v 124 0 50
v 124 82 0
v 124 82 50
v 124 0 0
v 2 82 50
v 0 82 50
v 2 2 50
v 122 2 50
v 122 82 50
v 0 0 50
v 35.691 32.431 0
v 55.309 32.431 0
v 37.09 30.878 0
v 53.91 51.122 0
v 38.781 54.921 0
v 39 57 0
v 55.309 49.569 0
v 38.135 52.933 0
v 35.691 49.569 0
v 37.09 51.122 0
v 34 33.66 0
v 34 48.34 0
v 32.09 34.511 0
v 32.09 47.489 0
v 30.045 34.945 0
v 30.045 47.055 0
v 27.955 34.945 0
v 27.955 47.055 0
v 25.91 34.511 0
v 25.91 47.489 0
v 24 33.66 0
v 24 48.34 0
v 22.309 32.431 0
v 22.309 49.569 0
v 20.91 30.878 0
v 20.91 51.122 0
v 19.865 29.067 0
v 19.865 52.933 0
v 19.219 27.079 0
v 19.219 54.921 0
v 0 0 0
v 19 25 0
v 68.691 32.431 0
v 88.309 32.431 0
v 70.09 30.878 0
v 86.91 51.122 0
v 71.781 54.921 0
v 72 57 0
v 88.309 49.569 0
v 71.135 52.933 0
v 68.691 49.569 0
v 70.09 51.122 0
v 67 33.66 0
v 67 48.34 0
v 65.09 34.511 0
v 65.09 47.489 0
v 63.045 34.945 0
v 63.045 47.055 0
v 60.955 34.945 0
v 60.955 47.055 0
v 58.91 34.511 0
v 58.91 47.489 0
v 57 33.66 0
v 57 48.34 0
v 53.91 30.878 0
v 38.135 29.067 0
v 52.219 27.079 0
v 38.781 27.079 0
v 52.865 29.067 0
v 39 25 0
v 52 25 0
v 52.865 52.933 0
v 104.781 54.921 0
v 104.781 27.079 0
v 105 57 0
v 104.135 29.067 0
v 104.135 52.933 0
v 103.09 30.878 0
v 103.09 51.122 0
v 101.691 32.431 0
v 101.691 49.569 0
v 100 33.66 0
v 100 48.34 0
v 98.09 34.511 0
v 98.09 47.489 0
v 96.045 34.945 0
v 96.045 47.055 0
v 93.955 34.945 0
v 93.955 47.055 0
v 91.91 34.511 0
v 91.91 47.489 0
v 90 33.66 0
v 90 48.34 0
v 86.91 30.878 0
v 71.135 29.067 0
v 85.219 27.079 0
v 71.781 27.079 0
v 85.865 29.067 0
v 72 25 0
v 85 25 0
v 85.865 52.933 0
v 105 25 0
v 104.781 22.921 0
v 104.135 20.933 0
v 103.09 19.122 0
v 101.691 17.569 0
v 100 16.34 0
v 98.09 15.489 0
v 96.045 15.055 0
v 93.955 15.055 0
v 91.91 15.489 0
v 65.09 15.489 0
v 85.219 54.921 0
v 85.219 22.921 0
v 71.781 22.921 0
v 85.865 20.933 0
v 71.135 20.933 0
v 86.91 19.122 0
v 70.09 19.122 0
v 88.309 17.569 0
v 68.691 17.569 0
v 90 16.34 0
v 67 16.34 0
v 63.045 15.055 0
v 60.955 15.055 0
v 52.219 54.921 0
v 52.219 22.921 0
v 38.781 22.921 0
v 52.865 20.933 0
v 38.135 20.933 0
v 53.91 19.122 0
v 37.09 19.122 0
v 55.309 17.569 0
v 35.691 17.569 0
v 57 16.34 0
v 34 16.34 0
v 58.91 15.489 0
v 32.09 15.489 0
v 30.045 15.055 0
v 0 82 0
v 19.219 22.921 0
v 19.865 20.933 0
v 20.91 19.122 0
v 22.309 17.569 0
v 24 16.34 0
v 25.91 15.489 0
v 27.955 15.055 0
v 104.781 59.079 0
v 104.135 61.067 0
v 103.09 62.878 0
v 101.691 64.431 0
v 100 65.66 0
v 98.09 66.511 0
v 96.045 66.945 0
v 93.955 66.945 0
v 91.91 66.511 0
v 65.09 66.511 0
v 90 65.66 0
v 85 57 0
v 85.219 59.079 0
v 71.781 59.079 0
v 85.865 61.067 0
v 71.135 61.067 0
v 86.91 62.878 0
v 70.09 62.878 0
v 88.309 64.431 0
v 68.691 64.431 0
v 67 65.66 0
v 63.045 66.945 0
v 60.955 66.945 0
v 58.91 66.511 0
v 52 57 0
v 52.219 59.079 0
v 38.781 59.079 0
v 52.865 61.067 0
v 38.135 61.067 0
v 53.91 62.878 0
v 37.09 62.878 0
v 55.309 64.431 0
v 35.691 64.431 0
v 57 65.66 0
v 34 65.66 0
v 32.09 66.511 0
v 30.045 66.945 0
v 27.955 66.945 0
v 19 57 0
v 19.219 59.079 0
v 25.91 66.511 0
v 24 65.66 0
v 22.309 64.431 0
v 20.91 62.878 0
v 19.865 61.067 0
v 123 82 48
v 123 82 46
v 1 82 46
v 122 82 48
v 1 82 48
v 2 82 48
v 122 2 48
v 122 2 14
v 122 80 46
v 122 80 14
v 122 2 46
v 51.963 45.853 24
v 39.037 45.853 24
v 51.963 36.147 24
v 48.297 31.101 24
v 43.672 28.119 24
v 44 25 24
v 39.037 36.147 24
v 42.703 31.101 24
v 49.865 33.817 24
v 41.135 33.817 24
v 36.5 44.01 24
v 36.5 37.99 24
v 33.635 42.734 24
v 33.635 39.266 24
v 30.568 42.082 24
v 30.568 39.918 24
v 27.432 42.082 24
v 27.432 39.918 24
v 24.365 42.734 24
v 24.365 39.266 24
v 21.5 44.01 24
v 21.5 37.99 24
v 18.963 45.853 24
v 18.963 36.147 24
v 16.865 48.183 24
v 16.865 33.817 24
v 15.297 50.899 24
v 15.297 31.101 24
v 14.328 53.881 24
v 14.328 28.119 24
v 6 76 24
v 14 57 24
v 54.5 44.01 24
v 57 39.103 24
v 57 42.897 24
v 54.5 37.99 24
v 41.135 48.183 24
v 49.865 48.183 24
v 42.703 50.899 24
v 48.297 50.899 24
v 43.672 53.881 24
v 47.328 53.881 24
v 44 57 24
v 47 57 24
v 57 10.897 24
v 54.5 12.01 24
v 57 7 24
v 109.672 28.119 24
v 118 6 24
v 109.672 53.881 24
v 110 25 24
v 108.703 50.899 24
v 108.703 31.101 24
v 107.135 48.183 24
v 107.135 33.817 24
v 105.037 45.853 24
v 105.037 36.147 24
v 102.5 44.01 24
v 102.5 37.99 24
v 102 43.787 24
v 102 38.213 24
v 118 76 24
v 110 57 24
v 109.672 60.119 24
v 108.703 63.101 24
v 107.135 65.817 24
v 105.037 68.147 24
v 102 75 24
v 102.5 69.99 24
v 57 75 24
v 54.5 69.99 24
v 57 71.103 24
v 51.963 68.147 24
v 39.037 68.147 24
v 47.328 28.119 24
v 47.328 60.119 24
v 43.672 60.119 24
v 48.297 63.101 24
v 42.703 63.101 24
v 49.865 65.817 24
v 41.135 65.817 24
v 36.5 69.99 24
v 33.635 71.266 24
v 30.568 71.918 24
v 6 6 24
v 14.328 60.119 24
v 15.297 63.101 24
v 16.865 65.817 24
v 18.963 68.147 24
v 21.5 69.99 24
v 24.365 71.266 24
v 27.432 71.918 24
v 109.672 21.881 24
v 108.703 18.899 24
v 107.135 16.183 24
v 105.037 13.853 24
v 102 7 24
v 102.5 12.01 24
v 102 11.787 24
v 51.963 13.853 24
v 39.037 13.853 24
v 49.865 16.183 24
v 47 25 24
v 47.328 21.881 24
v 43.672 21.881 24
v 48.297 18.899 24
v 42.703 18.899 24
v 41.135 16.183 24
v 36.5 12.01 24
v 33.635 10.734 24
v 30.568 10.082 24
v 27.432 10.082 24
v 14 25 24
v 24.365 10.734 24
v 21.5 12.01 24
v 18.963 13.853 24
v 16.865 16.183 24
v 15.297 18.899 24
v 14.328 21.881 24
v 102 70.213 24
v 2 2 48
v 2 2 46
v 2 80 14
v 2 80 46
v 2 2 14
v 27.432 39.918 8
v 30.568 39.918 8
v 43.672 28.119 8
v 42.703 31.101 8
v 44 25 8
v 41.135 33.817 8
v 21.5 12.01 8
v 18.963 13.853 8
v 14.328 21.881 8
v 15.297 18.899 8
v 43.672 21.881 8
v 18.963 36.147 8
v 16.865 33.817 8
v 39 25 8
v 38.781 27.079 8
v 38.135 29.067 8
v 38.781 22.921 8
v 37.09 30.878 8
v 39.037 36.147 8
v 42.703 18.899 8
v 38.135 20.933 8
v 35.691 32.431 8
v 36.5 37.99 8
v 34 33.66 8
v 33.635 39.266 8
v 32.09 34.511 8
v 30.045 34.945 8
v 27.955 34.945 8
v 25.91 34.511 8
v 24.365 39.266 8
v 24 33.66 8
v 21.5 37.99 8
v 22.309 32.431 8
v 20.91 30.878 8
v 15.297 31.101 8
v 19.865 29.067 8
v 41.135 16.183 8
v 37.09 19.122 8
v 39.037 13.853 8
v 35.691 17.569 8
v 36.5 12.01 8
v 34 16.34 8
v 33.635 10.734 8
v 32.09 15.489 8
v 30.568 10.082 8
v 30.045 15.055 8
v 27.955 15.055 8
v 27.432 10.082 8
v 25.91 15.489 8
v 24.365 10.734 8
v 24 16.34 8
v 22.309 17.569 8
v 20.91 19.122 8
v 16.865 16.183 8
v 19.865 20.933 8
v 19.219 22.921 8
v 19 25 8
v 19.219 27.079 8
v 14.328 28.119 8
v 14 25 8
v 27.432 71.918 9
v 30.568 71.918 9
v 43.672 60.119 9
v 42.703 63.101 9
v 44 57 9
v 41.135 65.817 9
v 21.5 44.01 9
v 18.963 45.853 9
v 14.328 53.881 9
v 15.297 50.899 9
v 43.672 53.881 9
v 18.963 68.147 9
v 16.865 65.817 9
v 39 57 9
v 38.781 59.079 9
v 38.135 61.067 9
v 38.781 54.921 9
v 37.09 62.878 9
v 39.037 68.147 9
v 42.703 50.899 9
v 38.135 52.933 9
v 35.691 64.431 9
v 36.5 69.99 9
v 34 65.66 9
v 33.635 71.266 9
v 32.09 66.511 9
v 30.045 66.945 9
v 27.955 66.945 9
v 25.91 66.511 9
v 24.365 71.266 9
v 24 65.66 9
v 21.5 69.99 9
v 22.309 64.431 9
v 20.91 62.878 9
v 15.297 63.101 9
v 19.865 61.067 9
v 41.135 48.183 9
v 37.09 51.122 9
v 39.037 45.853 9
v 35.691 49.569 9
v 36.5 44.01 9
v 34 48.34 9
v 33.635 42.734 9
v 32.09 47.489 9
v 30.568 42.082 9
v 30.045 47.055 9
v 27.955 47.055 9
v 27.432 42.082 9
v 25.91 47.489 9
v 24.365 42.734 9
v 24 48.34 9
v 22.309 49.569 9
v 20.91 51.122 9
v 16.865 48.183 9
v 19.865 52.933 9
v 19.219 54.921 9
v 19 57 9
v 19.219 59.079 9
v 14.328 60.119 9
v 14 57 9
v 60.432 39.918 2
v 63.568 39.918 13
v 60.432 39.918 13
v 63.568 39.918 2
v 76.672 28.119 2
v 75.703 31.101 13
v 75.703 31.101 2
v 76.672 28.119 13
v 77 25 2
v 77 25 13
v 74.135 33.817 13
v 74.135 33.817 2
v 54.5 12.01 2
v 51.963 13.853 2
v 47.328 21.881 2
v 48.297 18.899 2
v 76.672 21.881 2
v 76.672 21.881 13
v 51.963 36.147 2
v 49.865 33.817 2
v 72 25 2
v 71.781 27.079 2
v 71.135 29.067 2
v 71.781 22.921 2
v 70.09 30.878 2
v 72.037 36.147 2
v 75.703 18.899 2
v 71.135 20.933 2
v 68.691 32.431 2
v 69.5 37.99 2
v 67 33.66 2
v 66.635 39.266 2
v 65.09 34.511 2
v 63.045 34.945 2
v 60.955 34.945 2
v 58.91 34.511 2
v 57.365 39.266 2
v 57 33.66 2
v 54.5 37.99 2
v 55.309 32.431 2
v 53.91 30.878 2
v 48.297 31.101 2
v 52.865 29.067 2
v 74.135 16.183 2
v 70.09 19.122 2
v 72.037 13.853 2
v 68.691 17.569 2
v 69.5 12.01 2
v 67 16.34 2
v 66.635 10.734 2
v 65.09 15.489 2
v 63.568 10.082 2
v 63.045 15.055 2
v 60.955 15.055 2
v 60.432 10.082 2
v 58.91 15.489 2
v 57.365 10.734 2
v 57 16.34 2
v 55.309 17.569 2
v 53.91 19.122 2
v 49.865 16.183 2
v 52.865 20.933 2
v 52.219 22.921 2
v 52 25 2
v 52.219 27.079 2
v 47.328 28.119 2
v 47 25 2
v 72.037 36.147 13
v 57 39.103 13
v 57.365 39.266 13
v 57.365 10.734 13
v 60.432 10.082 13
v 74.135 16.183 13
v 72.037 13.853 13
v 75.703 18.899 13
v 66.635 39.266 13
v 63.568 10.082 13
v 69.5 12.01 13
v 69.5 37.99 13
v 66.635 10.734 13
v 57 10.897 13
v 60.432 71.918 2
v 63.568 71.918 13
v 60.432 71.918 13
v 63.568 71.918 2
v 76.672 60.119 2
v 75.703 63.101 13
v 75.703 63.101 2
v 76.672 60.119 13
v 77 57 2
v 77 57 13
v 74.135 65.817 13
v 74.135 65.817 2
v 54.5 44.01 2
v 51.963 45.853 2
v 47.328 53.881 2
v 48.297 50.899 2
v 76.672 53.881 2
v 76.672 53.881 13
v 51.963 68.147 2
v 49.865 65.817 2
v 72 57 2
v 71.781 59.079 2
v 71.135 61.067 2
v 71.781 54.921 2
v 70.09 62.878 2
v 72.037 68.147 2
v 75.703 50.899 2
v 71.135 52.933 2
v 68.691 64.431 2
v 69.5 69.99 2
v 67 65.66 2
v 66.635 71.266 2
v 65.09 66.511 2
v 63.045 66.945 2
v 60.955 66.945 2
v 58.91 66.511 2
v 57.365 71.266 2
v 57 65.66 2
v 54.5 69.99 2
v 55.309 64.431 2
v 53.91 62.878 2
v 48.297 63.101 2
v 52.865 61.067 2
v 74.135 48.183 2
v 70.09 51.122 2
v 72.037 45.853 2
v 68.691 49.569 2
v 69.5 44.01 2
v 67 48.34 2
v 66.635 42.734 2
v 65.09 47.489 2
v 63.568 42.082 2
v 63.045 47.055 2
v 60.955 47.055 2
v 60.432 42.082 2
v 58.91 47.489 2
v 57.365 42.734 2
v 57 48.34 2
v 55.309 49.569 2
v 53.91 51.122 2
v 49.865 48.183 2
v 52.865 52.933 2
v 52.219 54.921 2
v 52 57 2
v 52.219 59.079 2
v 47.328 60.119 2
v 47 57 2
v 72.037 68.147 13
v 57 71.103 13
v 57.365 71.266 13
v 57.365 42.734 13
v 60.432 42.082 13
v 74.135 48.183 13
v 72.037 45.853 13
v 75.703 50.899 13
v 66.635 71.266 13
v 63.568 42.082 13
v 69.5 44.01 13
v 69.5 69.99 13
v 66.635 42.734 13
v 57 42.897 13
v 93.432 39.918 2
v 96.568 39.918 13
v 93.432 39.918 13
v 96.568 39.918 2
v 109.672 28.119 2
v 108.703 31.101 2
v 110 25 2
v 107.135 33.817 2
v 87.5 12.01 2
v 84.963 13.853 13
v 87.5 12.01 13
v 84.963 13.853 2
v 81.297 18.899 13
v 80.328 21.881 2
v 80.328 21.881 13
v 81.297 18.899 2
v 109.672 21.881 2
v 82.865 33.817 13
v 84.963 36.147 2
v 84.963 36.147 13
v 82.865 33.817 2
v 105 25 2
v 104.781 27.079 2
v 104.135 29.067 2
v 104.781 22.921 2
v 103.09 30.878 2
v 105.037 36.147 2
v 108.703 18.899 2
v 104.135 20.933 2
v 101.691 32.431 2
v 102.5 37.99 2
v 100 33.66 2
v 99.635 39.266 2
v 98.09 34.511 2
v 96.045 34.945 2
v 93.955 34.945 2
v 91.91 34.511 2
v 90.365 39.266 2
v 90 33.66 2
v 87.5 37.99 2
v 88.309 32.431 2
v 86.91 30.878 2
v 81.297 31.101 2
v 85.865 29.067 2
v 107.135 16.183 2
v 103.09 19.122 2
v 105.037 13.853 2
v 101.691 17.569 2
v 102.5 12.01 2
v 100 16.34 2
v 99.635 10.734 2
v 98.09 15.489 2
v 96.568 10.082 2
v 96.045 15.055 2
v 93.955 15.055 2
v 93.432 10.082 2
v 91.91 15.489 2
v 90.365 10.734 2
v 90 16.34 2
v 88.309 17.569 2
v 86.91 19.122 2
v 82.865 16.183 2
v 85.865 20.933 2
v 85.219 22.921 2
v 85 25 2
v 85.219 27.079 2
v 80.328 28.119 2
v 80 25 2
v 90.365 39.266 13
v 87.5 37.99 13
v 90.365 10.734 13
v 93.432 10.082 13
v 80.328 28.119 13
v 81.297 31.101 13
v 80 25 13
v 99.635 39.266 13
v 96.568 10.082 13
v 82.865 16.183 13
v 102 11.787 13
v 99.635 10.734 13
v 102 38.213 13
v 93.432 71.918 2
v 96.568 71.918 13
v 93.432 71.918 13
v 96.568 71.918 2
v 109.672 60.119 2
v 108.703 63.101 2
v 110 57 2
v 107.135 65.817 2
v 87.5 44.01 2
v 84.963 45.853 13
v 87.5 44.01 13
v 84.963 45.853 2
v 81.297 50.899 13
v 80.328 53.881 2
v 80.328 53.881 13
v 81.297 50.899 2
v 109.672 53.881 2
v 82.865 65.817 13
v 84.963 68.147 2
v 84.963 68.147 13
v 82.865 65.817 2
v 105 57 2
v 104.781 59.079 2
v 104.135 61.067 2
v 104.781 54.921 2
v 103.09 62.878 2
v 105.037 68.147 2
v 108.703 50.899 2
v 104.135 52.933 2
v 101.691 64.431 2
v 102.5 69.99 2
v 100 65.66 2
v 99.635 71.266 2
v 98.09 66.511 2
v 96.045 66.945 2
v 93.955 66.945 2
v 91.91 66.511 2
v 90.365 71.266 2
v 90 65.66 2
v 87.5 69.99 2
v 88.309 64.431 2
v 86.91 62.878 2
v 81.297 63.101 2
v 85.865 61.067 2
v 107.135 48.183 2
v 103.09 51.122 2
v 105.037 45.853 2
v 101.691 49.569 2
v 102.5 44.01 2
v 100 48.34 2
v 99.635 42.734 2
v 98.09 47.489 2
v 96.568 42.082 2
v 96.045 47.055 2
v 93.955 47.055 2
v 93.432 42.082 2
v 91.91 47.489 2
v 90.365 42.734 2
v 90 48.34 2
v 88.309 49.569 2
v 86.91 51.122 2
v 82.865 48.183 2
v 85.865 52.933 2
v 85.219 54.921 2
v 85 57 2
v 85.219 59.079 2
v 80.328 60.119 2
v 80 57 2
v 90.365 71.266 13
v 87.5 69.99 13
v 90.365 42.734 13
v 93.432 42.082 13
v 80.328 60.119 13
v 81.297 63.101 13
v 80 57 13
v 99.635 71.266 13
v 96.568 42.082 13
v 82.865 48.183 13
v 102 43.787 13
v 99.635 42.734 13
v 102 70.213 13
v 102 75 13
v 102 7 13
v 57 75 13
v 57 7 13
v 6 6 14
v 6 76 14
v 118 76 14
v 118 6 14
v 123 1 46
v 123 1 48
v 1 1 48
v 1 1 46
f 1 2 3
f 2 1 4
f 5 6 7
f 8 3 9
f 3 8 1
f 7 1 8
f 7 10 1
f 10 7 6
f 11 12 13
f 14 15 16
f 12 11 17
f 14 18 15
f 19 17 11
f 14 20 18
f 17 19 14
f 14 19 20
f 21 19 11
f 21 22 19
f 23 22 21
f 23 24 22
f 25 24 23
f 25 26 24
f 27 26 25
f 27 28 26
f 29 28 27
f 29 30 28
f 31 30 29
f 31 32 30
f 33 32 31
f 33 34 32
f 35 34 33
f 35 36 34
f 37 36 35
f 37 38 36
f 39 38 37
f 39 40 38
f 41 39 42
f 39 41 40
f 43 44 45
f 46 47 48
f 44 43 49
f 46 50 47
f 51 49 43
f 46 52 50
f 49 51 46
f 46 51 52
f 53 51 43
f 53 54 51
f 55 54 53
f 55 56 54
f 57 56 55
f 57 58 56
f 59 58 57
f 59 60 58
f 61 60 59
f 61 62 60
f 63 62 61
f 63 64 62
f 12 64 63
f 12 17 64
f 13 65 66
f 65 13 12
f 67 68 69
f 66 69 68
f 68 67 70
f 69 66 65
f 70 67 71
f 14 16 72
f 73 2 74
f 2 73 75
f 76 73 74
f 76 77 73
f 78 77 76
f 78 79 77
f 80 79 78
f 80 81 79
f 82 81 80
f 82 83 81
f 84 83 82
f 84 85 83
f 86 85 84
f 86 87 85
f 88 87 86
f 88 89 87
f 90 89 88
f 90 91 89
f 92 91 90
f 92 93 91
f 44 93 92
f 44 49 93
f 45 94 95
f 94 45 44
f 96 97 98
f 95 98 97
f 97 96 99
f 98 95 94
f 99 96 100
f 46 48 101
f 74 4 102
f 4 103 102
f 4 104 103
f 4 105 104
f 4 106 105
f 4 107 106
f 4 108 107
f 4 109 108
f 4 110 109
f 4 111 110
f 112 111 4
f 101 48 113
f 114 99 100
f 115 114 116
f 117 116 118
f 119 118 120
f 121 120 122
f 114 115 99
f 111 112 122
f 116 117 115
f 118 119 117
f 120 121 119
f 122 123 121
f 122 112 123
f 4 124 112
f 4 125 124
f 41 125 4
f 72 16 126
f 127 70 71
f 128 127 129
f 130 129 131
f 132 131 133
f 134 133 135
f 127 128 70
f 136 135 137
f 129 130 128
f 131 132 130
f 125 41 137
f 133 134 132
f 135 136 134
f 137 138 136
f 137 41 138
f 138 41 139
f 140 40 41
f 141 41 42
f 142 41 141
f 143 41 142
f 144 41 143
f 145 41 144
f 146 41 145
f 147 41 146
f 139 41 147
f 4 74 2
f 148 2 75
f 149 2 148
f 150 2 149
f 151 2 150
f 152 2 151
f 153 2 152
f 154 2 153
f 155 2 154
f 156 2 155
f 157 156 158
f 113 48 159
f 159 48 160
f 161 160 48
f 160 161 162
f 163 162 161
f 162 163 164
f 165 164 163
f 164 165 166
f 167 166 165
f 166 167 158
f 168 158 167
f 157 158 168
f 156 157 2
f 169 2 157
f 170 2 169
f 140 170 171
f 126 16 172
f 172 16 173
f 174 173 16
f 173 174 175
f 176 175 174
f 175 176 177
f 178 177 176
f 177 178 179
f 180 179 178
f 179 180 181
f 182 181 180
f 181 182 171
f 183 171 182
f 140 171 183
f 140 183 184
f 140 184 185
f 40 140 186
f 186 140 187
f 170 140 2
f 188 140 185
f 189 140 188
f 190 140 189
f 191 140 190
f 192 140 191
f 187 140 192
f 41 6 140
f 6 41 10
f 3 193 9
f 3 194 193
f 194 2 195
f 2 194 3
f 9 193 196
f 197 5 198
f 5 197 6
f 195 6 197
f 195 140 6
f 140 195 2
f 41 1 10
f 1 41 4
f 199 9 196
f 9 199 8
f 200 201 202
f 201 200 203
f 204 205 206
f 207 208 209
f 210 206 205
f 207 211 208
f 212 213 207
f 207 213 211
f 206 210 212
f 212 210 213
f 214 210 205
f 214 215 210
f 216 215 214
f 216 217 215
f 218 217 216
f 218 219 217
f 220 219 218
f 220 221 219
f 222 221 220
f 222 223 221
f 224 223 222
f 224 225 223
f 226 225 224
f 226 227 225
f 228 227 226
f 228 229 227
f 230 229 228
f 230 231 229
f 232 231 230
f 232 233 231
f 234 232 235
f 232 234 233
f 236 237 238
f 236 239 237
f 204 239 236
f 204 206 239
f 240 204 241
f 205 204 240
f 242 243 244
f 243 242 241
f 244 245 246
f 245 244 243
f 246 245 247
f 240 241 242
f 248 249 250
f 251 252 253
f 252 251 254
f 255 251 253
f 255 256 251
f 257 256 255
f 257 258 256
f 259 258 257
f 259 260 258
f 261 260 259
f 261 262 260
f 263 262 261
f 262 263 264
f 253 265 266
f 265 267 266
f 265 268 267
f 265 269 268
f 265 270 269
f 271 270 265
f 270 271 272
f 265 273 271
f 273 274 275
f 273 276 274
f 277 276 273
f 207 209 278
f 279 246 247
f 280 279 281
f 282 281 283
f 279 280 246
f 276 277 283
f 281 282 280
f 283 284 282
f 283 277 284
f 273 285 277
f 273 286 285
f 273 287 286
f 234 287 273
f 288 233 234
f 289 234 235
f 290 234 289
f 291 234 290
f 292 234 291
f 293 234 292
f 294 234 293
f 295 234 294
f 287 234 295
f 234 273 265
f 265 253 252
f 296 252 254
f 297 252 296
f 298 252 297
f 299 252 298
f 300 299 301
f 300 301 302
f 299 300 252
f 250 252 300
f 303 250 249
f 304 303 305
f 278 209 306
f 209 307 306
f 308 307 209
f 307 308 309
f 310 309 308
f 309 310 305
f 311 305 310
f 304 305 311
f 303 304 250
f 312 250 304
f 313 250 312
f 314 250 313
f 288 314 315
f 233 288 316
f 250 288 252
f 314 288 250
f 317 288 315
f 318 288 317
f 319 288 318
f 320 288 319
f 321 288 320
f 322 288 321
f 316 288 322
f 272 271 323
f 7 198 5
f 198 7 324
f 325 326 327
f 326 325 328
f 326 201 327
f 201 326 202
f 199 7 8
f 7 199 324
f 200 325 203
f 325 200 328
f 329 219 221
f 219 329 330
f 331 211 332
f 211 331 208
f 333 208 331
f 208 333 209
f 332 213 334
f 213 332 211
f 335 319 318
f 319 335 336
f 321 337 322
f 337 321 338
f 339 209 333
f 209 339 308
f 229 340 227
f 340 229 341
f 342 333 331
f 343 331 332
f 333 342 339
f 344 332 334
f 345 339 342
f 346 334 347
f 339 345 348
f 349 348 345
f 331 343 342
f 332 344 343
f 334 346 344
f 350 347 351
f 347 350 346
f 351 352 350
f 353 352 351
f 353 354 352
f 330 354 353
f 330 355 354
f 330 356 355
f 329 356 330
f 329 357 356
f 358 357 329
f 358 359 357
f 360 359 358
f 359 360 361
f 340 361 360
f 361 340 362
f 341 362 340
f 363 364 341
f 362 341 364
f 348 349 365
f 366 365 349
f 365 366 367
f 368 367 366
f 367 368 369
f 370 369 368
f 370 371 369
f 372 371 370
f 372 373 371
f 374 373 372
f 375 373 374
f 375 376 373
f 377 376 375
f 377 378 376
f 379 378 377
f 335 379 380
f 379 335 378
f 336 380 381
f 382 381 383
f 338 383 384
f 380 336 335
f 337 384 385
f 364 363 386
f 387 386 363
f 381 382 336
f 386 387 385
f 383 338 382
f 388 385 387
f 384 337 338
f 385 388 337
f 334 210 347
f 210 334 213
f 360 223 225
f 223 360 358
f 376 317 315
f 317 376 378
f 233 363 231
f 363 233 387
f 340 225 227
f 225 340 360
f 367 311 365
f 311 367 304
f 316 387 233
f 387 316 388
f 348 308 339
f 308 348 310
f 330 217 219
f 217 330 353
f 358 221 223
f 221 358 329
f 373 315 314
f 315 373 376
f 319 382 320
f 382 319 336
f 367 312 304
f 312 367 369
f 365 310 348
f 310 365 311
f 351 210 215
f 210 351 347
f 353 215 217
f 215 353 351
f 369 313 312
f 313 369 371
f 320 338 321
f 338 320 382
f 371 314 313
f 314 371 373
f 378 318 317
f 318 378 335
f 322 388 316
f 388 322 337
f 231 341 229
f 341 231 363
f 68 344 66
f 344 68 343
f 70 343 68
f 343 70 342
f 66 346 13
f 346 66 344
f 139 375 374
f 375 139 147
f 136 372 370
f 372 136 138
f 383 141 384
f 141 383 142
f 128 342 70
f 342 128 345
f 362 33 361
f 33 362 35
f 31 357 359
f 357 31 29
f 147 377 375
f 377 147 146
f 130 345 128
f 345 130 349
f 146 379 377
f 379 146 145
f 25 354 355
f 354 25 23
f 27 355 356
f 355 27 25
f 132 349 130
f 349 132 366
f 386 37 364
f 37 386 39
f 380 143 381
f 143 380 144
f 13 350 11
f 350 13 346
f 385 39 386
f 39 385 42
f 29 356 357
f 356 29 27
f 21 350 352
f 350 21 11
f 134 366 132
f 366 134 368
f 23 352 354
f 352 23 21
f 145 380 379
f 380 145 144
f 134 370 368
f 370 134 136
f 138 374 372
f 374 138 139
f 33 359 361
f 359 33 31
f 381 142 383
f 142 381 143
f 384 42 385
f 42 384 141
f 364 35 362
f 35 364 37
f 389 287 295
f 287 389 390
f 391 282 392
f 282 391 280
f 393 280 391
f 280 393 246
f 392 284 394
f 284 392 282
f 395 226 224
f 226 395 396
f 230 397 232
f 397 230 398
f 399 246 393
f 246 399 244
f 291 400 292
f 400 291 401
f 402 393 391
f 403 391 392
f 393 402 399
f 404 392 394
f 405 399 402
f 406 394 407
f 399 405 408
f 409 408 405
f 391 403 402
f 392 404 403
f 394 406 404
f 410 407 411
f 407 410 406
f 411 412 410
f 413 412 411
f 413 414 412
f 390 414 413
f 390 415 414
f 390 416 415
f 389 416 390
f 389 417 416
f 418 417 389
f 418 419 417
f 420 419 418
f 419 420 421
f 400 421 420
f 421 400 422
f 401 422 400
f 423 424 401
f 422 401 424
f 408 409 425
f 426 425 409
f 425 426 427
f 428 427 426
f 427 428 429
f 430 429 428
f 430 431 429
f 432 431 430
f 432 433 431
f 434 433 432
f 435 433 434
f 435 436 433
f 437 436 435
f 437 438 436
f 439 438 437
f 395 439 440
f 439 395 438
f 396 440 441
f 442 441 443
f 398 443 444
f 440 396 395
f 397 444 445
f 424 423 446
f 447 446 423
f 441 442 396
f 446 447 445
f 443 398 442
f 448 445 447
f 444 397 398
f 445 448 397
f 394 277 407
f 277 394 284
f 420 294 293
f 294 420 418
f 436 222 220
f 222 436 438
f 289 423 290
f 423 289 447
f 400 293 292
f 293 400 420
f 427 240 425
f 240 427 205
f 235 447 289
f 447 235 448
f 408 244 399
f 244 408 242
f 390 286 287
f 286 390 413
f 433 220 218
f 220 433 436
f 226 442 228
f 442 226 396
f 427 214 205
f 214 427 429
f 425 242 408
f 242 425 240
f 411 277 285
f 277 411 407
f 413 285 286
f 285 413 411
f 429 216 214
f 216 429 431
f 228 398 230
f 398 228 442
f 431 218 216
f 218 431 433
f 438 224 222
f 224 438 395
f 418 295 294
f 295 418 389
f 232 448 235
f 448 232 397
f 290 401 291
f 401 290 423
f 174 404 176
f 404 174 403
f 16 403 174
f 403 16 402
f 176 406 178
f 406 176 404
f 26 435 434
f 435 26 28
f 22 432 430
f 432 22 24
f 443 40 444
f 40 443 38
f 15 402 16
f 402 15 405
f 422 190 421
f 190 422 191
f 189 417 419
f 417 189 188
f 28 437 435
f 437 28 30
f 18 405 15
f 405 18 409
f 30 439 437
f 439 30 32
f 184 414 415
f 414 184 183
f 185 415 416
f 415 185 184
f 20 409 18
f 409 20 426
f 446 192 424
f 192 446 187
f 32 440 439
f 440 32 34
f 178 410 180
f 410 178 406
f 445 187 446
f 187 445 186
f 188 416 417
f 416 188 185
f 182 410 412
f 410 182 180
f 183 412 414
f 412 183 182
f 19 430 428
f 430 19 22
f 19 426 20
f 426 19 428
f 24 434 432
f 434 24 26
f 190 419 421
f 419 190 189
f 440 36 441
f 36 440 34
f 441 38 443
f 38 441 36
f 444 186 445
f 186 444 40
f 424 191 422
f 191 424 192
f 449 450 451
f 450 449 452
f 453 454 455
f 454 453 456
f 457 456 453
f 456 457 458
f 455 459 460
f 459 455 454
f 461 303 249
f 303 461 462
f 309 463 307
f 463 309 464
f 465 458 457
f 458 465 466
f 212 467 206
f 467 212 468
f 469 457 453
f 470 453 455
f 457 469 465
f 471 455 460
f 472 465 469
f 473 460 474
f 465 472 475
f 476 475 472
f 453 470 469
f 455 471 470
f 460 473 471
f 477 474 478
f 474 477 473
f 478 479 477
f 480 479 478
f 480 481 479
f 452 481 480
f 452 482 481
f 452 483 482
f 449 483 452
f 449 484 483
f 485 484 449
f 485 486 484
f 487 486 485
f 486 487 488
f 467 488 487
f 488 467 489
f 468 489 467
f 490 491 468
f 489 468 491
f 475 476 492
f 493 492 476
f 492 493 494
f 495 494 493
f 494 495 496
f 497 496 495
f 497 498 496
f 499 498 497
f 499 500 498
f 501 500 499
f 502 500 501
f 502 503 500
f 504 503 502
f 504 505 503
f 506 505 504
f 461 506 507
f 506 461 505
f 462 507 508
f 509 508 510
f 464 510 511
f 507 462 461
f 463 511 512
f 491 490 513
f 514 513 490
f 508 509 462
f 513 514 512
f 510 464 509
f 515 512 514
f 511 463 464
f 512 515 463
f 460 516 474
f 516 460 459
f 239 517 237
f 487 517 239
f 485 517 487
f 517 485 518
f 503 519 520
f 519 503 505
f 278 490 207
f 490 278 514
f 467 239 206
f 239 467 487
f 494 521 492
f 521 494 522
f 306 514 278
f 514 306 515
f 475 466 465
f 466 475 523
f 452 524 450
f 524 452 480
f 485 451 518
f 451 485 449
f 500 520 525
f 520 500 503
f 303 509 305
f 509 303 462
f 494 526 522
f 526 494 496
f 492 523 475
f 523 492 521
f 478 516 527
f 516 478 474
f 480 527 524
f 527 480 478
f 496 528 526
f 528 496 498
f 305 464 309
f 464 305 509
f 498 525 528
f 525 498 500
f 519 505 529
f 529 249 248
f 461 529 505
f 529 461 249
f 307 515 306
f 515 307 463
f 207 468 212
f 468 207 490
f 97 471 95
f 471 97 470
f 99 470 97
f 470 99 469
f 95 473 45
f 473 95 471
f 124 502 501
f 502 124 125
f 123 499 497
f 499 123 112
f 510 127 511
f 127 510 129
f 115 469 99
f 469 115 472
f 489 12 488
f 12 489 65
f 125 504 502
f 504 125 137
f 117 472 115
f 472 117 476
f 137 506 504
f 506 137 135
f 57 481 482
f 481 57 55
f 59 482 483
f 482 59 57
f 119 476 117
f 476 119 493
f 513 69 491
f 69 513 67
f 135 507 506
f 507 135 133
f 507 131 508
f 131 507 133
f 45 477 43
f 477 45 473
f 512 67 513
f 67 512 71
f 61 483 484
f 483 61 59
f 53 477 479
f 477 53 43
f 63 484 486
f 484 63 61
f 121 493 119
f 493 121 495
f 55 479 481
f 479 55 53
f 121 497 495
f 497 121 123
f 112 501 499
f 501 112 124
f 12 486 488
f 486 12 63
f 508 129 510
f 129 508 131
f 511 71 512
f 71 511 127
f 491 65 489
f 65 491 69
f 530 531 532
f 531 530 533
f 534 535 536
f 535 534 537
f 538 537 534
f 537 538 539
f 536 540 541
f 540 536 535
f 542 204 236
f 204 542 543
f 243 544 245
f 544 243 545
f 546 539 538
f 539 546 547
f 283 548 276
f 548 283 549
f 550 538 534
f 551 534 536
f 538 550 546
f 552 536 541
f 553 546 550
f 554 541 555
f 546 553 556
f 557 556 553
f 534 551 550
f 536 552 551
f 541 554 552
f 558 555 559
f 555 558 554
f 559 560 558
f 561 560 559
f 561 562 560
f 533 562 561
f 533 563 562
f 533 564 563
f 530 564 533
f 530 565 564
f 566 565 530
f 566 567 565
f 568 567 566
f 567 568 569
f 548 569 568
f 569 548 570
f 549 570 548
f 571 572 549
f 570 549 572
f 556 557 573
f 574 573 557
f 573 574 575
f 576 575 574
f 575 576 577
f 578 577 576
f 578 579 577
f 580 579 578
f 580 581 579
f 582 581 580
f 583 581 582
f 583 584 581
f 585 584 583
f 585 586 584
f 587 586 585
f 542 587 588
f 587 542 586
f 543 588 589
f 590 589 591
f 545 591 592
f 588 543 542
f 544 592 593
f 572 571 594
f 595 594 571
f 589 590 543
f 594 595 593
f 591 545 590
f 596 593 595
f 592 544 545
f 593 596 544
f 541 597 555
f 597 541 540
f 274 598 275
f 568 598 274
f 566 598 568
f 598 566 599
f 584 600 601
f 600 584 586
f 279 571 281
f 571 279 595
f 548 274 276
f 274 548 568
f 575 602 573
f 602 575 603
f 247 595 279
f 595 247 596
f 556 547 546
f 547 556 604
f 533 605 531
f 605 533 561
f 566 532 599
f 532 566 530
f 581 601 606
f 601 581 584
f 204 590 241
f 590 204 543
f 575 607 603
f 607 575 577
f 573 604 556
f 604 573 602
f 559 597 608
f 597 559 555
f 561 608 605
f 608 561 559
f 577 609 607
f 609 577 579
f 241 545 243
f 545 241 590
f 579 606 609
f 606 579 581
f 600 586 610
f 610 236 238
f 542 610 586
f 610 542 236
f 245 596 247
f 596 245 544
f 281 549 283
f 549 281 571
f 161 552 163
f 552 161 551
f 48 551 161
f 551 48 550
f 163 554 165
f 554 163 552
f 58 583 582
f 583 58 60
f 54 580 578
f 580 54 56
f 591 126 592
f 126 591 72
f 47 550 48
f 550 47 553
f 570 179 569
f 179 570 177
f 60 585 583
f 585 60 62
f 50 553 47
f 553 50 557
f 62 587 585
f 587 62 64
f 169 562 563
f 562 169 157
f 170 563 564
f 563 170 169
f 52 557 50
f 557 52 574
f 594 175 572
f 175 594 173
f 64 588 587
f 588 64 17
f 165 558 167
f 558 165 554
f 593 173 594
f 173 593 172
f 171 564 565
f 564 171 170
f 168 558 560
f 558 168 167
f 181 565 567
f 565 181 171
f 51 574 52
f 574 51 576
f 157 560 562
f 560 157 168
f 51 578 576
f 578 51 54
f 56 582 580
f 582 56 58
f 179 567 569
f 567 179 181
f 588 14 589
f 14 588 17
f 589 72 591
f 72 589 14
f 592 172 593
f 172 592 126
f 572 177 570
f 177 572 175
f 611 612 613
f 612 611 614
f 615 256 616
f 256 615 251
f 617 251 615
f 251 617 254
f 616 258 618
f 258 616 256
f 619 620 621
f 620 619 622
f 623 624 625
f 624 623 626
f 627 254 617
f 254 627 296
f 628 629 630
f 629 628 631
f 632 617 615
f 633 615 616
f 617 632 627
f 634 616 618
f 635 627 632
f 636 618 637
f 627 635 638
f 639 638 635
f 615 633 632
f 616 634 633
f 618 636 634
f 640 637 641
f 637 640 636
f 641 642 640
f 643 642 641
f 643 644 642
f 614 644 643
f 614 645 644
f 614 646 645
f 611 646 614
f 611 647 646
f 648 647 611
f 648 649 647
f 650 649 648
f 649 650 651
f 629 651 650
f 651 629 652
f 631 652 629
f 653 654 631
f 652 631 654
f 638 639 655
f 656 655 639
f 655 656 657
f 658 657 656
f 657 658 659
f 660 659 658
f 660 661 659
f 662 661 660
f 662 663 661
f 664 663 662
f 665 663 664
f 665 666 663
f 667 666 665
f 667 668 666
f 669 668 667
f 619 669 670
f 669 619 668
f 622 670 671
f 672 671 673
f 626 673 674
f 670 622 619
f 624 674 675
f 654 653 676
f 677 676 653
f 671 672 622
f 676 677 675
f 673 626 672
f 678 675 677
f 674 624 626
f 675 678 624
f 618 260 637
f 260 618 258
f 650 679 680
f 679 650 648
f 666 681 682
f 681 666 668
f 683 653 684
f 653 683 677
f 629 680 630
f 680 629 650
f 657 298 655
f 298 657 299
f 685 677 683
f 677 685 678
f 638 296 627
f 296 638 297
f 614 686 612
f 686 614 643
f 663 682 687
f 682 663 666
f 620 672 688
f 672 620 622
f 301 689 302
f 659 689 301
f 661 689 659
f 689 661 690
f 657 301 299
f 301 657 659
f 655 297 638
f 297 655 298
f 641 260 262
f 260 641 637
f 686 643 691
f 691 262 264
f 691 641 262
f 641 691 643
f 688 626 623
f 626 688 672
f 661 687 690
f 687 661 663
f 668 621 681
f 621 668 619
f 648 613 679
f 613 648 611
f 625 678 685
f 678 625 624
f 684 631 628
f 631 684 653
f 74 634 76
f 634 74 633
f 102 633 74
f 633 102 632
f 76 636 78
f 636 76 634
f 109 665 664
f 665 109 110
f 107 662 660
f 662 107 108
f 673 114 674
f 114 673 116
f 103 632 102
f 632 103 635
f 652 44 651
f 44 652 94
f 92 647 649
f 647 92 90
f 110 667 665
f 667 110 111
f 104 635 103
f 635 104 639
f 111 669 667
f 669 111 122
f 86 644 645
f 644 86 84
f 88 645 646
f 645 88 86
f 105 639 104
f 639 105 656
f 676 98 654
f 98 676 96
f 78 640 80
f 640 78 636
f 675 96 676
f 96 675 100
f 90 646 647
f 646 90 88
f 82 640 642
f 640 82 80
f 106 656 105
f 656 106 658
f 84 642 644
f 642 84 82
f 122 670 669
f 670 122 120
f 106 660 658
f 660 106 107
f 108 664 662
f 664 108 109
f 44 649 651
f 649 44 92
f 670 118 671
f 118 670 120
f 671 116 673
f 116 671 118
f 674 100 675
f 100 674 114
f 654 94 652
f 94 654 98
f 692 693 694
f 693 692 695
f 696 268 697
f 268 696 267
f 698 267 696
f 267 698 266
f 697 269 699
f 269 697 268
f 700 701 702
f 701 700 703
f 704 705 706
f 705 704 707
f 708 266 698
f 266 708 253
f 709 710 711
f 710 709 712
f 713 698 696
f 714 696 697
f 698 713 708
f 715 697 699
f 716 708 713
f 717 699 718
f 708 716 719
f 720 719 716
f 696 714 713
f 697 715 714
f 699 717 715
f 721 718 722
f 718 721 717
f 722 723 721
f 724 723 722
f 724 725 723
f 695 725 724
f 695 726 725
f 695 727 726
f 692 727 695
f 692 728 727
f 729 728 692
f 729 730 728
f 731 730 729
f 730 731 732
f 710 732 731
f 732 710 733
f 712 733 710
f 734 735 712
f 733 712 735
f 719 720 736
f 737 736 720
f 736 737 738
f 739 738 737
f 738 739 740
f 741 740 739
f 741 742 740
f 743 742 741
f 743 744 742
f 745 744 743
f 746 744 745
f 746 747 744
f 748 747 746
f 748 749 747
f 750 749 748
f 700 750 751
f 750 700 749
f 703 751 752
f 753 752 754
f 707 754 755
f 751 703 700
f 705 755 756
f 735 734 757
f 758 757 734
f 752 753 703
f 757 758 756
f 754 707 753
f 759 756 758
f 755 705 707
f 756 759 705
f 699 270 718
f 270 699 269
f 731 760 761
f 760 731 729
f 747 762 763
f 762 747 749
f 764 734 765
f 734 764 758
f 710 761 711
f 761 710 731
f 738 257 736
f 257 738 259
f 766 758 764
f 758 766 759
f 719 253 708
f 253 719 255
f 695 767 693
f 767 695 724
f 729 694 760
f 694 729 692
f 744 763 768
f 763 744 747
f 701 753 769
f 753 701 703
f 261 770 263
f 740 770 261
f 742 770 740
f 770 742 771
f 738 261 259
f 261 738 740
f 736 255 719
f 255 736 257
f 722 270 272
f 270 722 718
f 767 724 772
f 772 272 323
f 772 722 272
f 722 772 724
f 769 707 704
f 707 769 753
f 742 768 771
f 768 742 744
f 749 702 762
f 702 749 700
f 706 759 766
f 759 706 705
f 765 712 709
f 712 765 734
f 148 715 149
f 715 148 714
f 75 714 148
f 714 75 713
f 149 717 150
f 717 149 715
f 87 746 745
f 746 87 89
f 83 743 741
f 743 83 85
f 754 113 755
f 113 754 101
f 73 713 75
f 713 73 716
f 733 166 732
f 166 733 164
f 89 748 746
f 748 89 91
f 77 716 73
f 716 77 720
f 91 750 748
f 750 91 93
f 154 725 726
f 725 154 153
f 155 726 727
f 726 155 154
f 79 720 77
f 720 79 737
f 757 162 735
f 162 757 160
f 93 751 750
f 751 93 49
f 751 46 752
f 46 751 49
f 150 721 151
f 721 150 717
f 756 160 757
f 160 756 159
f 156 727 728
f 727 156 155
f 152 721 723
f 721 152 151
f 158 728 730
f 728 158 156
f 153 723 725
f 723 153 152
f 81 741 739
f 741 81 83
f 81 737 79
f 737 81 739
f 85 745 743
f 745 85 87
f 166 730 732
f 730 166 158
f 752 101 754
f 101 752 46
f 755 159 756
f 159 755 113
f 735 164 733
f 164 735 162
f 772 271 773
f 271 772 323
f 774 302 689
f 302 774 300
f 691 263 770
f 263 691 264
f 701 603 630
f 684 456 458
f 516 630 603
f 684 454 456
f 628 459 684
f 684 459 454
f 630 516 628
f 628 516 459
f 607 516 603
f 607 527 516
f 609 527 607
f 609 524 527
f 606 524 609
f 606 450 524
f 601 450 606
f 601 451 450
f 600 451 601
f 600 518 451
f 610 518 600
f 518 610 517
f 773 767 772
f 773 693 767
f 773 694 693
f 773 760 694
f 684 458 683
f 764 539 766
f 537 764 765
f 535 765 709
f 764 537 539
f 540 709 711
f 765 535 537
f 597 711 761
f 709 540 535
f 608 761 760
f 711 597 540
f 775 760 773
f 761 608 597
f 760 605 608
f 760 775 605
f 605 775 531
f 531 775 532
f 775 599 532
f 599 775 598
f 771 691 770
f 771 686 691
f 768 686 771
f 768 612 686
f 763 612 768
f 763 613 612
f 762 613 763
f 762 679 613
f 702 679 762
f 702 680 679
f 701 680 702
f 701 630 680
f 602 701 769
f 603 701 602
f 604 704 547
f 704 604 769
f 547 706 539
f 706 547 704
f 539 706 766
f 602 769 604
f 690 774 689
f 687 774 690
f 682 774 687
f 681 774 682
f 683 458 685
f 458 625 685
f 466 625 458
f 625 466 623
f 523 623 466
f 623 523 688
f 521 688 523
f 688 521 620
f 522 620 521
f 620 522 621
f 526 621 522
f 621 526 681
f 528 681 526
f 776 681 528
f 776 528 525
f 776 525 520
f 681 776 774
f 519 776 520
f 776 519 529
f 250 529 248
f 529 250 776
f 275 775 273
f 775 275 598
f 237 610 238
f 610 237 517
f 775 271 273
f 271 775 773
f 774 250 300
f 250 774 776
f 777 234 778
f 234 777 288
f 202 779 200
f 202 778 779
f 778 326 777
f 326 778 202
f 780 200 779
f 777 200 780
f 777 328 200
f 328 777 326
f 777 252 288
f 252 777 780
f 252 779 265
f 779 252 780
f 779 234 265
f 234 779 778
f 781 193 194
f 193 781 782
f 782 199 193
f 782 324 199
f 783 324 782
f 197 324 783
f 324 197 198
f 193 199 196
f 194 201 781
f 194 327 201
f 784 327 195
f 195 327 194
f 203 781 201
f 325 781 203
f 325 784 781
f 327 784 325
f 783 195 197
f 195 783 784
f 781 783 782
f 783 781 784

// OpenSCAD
difference() {
    cube([124,82,50]);
    translate([2,2,24])
        cube([120,78,60]);
    // vp token
    translate([29,25,8])
        cylinder(24,15,15);
    translate([29,25,-1])
        cylinder(24,10,10);
    // heaven 1
    translate([29,57,9])
        cylinder(24,15,15);
    translate([29,57,-1])
        cylinder(24,10,10);
    
    // heaven 2-4
    translate([62,25,2])
        cylinder(24,15,15);
    translate([62,25,-1])
        cylinder(24,10,10);
    translate([62,57,2])
        cylinder(24,15,15);
    translate([62,57,-1])
        cylinder(24,10,10);
    translate([95,25,2])
        cylinder(24,15,15);
    translate([95,25,-1])
        cylinder(24,10,10);
    translate([95,57,2])
        cylinder(24,15,15);
    translate([95,57,-1])
        cylinder(24,10,10);
    
    // feat cards
    translate([57,7,13])
        cube([45,68,15]);
   
    // figure place holder 
    translate([2,2,14])
        #cube([4,78,15]);
    translate([2,2,14])
        #cube([120,4,15]);
    translate([118,2,14])
        #cube([4,78,15]);
    translate([2,76,14])
        #cube([120,4,15]);
        
    // lid space
    translate([1,1,46])
        cube([122,83,2]);
    translate([2,2,46])
        cube([120,84,6]);
    
}
    


//difference() {
//    cube([70,300,60]);
//    translate([15,-1,50])
//        cube([40,302,20]);
//    for(i=[[2,80],[84,80],[166,80],[248,50]]) {
//        translate([2,i[0],4])
//            cube([66,i[1],60]);
//    }
//}
